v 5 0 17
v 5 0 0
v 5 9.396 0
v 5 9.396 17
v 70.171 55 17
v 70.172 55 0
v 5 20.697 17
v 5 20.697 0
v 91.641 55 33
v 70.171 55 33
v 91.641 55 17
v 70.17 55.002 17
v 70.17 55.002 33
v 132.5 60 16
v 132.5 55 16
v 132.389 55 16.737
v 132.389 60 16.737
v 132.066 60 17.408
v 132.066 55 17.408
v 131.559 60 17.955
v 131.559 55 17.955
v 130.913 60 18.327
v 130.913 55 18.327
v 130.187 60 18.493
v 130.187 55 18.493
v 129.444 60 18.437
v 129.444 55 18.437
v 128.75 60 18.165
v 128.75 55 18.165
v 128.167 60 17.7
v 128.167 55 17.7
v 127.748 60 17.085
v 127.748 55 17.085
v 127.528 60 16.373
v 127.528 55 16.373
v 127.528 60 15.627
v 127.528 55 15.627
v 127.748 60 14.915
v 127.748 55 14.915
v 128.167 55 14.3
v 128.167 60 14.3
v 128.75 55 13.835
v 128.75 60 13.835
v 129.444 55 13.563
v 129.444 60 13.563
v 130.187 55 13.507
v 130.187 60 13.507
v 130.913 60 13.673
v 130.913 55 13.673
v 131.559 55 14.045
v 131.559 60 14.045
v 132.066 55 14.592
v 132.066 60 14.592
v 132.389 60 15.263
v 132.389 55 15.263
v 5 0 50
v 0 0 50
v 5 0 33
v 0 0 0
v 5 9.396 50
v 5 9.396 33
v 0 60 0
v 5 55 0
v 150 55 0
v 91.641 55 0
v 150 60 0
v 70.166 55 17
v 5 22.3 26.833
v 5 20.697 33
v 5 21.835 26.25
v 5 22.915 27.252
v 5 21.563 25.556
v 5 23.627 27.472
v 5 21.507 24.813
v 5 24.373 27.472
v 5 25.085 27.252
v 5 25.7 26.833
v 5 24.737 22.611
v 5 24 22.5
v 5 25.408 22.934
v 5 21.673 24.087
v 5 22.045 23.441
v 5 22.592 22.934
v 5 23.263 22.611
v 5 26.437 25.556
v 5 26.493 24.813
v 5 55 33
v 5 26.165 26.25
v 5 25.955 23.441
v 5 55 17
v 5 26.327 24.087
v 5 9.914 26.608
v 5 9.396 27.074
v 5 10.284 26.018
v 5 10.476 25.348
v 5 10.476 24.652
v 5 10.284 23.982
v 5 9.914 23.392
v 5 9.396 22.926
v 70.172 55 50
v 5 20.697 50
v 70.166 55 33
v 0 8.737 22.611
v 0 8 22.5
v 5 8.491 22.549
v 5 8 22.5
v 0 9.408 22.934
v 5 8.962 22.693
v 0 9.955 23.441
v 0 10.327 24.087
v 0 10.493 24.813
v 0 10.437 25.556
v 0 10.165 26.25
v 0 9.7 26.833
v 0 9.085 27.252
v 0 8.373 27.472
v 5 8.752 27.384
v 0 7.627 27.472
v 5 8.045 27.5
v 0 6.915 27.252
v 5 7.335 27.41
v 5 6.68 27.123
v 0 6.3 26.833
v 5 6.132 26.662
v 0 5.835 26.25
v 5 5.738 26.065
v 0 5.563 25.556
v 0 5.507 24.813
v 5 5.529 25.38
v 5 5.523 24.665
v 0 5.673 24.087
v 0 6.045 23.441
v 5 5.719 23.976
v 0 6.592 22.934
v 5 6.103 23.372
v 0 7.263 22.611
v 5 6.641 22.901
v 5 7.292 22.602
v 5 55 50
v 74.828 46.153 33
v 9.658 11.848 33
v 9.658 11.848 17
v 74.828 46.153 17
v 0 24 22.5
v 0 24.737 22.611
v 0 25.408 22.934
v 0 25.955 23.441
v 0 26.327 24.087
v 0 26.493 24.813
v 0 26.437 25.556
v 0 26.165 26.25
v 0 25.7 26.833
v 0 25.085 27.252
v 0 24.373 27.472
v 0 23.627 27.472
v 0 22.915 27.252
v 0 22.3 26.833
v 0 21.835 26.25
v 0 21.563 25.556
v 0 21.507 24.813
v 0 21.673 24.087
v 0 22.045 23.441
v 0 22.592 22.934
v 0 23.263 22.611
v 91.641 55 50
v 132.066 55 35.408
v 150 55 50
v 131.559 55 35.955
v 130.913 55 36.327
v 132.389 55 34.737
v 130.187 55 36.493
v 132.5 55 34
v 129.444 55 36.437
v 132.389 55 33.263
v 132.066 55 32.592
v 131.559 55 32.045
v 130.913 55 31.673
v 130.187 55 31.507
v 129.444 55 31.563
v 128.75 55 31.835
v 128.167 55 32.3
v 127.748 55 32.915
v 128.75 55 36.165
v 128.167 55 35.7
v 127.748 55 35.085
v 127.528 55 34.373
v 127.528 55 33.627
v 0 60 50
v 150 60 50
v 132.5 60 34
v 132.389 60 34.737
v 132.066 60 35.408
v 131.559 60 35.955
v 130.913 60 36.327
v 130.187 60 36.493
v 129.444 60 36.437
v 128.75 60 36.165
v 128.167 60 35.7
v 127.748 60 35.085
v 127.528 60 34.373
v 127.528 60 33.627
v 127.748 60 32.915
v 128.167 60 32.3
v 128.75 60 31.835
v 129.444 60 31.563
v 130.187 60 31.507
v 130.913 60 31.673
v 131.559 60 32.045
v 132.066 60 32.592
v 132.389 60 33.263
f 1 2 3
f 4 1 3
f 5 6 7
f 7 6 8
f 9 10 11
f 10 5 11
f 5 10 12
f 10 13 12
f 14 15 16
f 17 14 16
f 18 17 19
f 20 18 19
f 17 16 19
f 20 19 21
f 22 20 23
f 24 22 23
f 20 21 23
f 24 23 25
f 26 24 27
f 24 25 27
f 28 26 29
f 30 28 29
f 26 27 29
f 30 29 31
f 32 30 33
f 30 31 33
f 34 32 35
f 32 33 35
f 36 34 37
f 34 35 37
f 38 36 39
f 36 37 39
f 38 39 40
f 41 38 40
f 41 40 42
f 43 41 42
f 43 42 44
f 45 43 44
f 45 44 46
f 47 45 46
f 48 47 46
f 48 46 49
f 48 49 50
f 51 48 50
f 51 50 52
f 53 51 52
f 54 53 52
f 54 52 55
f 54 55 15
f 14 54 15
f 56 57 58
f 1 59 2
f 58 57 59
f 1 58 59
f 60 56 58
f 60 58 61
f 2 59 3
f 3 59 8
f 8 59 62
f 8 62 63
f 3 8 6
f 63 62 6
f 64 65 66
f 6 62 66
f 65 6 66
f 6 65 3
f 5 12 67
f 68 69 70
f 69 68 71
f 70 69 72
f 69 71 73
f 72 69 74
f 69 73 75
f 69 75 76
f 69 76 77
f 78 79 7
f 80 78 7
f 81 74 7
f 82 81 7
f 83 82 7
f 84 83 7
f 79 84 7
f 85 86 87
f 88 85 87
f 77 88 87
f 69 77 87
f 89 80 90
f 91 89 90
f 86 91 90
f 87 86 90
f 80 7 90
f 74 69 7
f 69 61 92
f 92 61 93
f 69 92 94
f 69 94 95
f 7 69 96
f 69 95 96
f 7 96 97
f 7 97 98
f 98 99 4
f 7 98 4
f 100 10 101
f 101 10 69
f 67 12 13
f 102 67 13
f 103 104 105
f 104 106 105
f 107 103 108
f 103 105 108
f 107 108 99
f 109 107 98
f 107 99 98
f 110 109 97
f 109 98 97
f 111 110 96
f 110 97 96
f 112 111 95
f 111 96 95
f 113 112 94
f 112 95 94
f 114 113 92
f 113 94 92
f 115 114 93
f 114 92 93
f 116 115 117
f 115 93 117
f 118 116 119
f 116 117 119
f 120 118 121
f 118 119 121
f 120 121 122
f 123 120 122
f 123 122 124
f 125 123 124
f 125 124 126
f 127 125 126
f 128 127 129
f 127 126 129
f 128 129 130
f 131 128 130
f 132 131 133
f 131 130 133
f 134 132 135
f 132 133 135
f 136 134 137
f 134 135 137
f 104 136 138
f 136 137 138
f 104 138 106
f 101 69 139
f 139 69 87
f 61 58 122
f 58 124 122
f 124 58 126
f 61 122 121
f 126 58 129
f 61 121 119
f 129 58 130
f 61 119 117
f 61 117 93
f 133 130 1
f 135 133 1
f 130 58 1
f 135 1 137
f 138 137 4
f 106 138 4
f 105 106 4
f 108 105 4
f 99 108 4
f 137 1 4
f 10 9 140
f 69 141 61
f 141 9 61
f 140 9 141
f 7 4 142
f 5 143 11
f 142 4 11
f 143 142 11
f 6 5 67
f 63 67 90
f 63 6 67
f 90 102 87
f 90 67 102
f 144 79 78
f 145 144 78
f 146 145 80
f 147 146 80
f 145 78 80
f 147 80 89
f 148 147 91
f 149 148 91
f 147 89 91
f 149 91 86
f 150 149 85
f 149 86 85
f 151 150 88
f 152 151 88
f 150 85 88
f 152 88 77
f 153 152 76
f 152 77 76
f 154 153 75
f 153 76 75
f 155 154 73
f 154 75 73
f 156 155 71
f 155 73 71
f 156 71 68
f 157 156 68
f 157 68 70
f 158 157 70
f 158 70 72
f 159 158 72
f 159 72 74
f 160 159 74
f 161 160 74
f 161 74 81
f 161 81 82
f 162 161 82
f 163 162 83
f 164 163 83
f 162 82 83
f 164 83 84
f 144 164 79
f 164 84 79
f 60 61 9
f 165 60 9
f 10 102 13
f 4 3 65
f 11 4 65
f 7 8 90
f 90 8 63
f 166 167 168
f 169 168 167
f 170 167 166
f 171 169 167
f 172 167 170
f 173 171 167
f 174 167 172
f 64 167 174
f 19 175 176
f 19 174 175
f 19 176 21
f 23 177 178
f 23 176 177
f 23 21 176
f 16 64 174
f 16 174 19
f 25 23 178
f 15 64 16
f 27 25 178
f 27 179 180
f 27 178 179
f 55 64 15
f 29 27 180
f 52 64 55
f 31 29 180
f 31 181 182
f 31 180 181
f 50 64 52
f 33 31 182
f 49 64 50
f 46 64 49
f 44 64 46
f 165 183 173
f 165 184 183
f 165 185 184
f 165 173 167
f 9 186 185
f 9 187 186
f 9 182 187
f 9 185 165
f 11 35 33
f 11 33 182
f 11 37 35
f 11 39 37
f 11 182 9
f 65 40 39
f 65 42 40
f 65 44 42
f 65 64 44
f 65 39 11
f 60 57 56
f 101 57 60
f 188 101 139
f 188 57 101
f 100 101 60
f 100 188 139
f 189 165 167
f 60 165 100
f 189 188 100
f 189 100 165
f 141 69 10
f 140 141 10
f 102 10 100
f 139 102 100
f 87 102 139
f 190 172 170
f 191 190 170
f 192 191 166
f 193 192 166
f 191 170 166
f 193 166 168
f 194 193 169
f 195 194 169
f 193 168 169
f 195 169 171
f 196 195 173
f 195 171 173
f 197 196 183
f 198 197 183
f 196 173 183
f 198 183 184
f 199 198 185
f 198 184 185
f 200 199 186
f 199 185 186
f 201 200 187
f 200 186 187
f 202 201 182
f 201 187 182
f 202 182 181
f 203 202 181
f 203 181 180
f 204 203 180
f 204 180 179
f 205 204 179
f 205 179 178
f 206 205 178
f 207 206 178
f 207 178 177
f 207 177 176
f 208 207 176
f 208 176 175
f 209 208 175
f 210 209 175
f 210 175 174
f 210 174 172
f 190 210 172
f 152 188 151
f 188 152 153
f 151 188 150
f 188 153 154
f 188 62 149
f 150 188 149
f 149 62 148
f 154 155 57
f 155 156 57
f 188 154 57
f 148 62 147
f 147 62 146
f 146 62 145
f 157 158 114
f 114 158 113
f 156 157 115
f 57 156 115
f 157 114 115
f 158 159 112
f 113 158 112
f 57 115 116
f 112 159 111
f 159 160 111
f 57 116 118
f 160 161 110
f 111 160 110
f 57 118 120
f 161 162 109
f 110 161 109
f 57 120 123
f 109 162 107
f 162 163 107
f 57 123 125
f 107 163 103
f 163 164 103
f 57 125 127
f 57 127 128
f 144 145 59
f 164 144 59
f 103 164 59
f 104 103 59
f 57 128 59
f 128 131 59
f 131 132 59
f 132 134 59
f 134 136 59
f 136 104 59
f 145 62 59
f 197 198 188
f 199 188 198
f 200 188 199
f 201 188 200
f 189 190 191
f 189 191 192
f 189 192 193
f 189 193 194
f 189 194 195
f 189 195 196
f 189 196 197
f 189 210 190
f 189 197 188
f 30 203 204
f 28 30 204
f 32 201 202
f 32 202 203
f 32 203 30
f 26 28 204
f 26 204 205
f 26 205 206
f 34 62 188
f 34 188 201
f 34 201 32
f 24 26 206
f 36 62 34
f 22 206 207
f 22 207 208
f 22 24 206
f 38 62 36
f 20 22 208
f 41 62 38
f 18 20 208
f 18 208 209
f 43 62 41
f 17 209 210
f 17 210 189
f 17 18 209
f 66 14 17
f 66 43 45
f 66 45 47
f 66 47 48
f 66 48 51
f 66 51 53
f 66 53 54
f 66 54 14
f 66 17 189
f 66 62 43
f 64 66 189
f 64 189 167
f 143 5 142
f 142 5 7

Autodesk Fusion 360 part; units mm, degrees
sketch "Sketch1" plane through (0, 0, 0) normal (0, 0, 1) x (1, 0, 0)
  line L0 (0, 0) -> (5, 0)
  line L1 (0, 60) -> (0, 0)
  line L2 (0, 60) -> (150, 60)
  line L3 (150, 60) -> (150, 55)
  line L4 (5, 9.3963) -> (91.6413, 55)
  line L5 (5, 9.3963) -> (91.6413, 55)
  line L6 (70.1715, 55) -> (5, 20.6969)
  line L7 (5, 0) -> (5, 9.3963)
  line L8 (5, 20.6969) -> (5, 55)
  line L9 (150, 55) -> (91.6413, 55)
  line L10 (70.1715, 55) -> (5, 55)
  dimension "d1" = 5
  dimension "d2" = 60
  dimension "d3" = 150
  dimension "d9" = 5
  dimension "d10" = 10
extrude "Extrude1" add sketch "Sketch1" along normal blind 50
sketch "Sketch2" plane through (-2.7881, 5.297, 0) normal (0.4658, -0.8849, 0) x (0, 0, -1)
  line L0 (0, 8.801) -> (0, 106.7113)
  line L1 (0, 106.7113) -> (-50, 106.7113)
  line L2 (-50, 106.7113) -> (-50, 8.801)
  line L3 (-50, 8.801) -> (0, 8.801)
  line L4 (-33, 106.7113) -> (-17, 106.7113)
  line L5 (-17, 106.7113) -> (-17, 8.801)
  line L6 (-17, 8.801) -> (-33, 8.801)
  line L7 (-33, 8.801) -> (-33, 106.7113)
  dimension "d11" = 16
sketch "Sketch3" plane through (-7.4458, 14.1461, 0) normal (-0.4658, 0.8849, 0) x (0, 0, 1)
  line L0 (0, 87.7125) -> (0, 14.0645)
  line L1 (0, 14.0645) -> (50, 14.0645)
  line L2 (50, 14.0645) -> (50, 87.7125)
  line L3 (50, 87.7125) -> (0, 87.7125)
  line L4 (33, 8.801) -> (33, 106.7113)
  line L5 (17, 106.7113) -> (17, 8.801)
extrude "Extrude2" cut sketch "Sketch3" against normal blind 10 contours L1 L3 L4 L5
sketch "Sketch5" plane through (0, 0, 0) normal (0, 1, 0) x (1, 0, 0)
  line L0 (5, -17) -> (91.6413, -17)
  line L1 (91.6413, -17) -> (91.6413, -33)
  line L2 (91.6413, -33) -> (5, -33)
  line L3 (5, -33) -> (5, -17)
  line L4 (5, 0) -> (5, -50)
  line L5 (91.6413, 0) -> (91.6413, -50)
  dimension "d17" = 16
  dimension "d18" = 5
extrude "Extrude3" cut sketch "Sketch5" along normal blind 55
sketch "Sketch4" plane through (5, 0, 0) normal (1, 0, 0) x (0, 0, -1)
  line L0 (0, 0) -> (0, 9.3963)
  line L1 (0, 55) -> (-50, 55)
  line L2 (-50, 55) -> (-50, 20.6969)
  line L3 (-50, 20.6969) -> (-33, 20.6969)
  line L4 (-17, 20.6969) -> (0, 20.6969)
  circle A0 centre (-25, 8) radius 2.5
  circle A1 centre (-25, 24) radius 2.5
  line L5 (-50, 0) -> (0, 0)
  line L6 (0, 9.3963) -> (-17, 9.3963)
  line L7 (-17, 9.3963) -> (-17, 20.6969)
  line L8 (-33, 20.6969) -> (-33, 9.3963)
  line L9 (-33, 9.3963) -> (-50, 9.3963)
  line L10 (-50, 9.3963) -> (-50, 0)
  line L11 (0, 20.6969) -> (0, 55)
  dimension "d14" = 5
  dimension "d22" = 5
  dimension "d23" = 16
extrude "Extrude4" cut sketch "Sketch4" against normal blind 10 contours A0 | A1
sketch "Sketch6" plane through (0, 55, 0) normal (0, -1, 0) x (1, 0, 0)
  line L0 (91.6413, 0) -> (150, 0)
  line L1 (150, 0) -> (150, 50)
  line L2 (150, 50) -> (91.6413, 50)
  line L3 (91.6413, 50) -> (91.6413, 33)
  circle A0 centre (130, 34) radius 2.5
  circle A1 centre (130, 16) radius 2.5
  line L4 (91.6413, 33) -> (70.1715, 33)
  line L5 (70.1715, 33) -> (70.1715, 50)
  line L6 (70.1715, 50) -> (5, 50)
  line L7 (5, 50) -> (5, 0)
  line L8 (5, 0) -> (70.1715, 0)
  line L9 (70.1715, 0) -> (70.1715, 17)
  line L10 (70.1715, 17) -> (91.6413, 17)
  line L11 (91.6413, 17) -> (91.6413, 0)
  dimension "d26" = 5
  dimension "d27" = 20
  dimension "d29" = 5
  dimension "d32" = 16
  dimension "d33" = 16
extrude "Extrude5" cut sketch "Sketch6" against normal blind 10 contours A0 | A1
